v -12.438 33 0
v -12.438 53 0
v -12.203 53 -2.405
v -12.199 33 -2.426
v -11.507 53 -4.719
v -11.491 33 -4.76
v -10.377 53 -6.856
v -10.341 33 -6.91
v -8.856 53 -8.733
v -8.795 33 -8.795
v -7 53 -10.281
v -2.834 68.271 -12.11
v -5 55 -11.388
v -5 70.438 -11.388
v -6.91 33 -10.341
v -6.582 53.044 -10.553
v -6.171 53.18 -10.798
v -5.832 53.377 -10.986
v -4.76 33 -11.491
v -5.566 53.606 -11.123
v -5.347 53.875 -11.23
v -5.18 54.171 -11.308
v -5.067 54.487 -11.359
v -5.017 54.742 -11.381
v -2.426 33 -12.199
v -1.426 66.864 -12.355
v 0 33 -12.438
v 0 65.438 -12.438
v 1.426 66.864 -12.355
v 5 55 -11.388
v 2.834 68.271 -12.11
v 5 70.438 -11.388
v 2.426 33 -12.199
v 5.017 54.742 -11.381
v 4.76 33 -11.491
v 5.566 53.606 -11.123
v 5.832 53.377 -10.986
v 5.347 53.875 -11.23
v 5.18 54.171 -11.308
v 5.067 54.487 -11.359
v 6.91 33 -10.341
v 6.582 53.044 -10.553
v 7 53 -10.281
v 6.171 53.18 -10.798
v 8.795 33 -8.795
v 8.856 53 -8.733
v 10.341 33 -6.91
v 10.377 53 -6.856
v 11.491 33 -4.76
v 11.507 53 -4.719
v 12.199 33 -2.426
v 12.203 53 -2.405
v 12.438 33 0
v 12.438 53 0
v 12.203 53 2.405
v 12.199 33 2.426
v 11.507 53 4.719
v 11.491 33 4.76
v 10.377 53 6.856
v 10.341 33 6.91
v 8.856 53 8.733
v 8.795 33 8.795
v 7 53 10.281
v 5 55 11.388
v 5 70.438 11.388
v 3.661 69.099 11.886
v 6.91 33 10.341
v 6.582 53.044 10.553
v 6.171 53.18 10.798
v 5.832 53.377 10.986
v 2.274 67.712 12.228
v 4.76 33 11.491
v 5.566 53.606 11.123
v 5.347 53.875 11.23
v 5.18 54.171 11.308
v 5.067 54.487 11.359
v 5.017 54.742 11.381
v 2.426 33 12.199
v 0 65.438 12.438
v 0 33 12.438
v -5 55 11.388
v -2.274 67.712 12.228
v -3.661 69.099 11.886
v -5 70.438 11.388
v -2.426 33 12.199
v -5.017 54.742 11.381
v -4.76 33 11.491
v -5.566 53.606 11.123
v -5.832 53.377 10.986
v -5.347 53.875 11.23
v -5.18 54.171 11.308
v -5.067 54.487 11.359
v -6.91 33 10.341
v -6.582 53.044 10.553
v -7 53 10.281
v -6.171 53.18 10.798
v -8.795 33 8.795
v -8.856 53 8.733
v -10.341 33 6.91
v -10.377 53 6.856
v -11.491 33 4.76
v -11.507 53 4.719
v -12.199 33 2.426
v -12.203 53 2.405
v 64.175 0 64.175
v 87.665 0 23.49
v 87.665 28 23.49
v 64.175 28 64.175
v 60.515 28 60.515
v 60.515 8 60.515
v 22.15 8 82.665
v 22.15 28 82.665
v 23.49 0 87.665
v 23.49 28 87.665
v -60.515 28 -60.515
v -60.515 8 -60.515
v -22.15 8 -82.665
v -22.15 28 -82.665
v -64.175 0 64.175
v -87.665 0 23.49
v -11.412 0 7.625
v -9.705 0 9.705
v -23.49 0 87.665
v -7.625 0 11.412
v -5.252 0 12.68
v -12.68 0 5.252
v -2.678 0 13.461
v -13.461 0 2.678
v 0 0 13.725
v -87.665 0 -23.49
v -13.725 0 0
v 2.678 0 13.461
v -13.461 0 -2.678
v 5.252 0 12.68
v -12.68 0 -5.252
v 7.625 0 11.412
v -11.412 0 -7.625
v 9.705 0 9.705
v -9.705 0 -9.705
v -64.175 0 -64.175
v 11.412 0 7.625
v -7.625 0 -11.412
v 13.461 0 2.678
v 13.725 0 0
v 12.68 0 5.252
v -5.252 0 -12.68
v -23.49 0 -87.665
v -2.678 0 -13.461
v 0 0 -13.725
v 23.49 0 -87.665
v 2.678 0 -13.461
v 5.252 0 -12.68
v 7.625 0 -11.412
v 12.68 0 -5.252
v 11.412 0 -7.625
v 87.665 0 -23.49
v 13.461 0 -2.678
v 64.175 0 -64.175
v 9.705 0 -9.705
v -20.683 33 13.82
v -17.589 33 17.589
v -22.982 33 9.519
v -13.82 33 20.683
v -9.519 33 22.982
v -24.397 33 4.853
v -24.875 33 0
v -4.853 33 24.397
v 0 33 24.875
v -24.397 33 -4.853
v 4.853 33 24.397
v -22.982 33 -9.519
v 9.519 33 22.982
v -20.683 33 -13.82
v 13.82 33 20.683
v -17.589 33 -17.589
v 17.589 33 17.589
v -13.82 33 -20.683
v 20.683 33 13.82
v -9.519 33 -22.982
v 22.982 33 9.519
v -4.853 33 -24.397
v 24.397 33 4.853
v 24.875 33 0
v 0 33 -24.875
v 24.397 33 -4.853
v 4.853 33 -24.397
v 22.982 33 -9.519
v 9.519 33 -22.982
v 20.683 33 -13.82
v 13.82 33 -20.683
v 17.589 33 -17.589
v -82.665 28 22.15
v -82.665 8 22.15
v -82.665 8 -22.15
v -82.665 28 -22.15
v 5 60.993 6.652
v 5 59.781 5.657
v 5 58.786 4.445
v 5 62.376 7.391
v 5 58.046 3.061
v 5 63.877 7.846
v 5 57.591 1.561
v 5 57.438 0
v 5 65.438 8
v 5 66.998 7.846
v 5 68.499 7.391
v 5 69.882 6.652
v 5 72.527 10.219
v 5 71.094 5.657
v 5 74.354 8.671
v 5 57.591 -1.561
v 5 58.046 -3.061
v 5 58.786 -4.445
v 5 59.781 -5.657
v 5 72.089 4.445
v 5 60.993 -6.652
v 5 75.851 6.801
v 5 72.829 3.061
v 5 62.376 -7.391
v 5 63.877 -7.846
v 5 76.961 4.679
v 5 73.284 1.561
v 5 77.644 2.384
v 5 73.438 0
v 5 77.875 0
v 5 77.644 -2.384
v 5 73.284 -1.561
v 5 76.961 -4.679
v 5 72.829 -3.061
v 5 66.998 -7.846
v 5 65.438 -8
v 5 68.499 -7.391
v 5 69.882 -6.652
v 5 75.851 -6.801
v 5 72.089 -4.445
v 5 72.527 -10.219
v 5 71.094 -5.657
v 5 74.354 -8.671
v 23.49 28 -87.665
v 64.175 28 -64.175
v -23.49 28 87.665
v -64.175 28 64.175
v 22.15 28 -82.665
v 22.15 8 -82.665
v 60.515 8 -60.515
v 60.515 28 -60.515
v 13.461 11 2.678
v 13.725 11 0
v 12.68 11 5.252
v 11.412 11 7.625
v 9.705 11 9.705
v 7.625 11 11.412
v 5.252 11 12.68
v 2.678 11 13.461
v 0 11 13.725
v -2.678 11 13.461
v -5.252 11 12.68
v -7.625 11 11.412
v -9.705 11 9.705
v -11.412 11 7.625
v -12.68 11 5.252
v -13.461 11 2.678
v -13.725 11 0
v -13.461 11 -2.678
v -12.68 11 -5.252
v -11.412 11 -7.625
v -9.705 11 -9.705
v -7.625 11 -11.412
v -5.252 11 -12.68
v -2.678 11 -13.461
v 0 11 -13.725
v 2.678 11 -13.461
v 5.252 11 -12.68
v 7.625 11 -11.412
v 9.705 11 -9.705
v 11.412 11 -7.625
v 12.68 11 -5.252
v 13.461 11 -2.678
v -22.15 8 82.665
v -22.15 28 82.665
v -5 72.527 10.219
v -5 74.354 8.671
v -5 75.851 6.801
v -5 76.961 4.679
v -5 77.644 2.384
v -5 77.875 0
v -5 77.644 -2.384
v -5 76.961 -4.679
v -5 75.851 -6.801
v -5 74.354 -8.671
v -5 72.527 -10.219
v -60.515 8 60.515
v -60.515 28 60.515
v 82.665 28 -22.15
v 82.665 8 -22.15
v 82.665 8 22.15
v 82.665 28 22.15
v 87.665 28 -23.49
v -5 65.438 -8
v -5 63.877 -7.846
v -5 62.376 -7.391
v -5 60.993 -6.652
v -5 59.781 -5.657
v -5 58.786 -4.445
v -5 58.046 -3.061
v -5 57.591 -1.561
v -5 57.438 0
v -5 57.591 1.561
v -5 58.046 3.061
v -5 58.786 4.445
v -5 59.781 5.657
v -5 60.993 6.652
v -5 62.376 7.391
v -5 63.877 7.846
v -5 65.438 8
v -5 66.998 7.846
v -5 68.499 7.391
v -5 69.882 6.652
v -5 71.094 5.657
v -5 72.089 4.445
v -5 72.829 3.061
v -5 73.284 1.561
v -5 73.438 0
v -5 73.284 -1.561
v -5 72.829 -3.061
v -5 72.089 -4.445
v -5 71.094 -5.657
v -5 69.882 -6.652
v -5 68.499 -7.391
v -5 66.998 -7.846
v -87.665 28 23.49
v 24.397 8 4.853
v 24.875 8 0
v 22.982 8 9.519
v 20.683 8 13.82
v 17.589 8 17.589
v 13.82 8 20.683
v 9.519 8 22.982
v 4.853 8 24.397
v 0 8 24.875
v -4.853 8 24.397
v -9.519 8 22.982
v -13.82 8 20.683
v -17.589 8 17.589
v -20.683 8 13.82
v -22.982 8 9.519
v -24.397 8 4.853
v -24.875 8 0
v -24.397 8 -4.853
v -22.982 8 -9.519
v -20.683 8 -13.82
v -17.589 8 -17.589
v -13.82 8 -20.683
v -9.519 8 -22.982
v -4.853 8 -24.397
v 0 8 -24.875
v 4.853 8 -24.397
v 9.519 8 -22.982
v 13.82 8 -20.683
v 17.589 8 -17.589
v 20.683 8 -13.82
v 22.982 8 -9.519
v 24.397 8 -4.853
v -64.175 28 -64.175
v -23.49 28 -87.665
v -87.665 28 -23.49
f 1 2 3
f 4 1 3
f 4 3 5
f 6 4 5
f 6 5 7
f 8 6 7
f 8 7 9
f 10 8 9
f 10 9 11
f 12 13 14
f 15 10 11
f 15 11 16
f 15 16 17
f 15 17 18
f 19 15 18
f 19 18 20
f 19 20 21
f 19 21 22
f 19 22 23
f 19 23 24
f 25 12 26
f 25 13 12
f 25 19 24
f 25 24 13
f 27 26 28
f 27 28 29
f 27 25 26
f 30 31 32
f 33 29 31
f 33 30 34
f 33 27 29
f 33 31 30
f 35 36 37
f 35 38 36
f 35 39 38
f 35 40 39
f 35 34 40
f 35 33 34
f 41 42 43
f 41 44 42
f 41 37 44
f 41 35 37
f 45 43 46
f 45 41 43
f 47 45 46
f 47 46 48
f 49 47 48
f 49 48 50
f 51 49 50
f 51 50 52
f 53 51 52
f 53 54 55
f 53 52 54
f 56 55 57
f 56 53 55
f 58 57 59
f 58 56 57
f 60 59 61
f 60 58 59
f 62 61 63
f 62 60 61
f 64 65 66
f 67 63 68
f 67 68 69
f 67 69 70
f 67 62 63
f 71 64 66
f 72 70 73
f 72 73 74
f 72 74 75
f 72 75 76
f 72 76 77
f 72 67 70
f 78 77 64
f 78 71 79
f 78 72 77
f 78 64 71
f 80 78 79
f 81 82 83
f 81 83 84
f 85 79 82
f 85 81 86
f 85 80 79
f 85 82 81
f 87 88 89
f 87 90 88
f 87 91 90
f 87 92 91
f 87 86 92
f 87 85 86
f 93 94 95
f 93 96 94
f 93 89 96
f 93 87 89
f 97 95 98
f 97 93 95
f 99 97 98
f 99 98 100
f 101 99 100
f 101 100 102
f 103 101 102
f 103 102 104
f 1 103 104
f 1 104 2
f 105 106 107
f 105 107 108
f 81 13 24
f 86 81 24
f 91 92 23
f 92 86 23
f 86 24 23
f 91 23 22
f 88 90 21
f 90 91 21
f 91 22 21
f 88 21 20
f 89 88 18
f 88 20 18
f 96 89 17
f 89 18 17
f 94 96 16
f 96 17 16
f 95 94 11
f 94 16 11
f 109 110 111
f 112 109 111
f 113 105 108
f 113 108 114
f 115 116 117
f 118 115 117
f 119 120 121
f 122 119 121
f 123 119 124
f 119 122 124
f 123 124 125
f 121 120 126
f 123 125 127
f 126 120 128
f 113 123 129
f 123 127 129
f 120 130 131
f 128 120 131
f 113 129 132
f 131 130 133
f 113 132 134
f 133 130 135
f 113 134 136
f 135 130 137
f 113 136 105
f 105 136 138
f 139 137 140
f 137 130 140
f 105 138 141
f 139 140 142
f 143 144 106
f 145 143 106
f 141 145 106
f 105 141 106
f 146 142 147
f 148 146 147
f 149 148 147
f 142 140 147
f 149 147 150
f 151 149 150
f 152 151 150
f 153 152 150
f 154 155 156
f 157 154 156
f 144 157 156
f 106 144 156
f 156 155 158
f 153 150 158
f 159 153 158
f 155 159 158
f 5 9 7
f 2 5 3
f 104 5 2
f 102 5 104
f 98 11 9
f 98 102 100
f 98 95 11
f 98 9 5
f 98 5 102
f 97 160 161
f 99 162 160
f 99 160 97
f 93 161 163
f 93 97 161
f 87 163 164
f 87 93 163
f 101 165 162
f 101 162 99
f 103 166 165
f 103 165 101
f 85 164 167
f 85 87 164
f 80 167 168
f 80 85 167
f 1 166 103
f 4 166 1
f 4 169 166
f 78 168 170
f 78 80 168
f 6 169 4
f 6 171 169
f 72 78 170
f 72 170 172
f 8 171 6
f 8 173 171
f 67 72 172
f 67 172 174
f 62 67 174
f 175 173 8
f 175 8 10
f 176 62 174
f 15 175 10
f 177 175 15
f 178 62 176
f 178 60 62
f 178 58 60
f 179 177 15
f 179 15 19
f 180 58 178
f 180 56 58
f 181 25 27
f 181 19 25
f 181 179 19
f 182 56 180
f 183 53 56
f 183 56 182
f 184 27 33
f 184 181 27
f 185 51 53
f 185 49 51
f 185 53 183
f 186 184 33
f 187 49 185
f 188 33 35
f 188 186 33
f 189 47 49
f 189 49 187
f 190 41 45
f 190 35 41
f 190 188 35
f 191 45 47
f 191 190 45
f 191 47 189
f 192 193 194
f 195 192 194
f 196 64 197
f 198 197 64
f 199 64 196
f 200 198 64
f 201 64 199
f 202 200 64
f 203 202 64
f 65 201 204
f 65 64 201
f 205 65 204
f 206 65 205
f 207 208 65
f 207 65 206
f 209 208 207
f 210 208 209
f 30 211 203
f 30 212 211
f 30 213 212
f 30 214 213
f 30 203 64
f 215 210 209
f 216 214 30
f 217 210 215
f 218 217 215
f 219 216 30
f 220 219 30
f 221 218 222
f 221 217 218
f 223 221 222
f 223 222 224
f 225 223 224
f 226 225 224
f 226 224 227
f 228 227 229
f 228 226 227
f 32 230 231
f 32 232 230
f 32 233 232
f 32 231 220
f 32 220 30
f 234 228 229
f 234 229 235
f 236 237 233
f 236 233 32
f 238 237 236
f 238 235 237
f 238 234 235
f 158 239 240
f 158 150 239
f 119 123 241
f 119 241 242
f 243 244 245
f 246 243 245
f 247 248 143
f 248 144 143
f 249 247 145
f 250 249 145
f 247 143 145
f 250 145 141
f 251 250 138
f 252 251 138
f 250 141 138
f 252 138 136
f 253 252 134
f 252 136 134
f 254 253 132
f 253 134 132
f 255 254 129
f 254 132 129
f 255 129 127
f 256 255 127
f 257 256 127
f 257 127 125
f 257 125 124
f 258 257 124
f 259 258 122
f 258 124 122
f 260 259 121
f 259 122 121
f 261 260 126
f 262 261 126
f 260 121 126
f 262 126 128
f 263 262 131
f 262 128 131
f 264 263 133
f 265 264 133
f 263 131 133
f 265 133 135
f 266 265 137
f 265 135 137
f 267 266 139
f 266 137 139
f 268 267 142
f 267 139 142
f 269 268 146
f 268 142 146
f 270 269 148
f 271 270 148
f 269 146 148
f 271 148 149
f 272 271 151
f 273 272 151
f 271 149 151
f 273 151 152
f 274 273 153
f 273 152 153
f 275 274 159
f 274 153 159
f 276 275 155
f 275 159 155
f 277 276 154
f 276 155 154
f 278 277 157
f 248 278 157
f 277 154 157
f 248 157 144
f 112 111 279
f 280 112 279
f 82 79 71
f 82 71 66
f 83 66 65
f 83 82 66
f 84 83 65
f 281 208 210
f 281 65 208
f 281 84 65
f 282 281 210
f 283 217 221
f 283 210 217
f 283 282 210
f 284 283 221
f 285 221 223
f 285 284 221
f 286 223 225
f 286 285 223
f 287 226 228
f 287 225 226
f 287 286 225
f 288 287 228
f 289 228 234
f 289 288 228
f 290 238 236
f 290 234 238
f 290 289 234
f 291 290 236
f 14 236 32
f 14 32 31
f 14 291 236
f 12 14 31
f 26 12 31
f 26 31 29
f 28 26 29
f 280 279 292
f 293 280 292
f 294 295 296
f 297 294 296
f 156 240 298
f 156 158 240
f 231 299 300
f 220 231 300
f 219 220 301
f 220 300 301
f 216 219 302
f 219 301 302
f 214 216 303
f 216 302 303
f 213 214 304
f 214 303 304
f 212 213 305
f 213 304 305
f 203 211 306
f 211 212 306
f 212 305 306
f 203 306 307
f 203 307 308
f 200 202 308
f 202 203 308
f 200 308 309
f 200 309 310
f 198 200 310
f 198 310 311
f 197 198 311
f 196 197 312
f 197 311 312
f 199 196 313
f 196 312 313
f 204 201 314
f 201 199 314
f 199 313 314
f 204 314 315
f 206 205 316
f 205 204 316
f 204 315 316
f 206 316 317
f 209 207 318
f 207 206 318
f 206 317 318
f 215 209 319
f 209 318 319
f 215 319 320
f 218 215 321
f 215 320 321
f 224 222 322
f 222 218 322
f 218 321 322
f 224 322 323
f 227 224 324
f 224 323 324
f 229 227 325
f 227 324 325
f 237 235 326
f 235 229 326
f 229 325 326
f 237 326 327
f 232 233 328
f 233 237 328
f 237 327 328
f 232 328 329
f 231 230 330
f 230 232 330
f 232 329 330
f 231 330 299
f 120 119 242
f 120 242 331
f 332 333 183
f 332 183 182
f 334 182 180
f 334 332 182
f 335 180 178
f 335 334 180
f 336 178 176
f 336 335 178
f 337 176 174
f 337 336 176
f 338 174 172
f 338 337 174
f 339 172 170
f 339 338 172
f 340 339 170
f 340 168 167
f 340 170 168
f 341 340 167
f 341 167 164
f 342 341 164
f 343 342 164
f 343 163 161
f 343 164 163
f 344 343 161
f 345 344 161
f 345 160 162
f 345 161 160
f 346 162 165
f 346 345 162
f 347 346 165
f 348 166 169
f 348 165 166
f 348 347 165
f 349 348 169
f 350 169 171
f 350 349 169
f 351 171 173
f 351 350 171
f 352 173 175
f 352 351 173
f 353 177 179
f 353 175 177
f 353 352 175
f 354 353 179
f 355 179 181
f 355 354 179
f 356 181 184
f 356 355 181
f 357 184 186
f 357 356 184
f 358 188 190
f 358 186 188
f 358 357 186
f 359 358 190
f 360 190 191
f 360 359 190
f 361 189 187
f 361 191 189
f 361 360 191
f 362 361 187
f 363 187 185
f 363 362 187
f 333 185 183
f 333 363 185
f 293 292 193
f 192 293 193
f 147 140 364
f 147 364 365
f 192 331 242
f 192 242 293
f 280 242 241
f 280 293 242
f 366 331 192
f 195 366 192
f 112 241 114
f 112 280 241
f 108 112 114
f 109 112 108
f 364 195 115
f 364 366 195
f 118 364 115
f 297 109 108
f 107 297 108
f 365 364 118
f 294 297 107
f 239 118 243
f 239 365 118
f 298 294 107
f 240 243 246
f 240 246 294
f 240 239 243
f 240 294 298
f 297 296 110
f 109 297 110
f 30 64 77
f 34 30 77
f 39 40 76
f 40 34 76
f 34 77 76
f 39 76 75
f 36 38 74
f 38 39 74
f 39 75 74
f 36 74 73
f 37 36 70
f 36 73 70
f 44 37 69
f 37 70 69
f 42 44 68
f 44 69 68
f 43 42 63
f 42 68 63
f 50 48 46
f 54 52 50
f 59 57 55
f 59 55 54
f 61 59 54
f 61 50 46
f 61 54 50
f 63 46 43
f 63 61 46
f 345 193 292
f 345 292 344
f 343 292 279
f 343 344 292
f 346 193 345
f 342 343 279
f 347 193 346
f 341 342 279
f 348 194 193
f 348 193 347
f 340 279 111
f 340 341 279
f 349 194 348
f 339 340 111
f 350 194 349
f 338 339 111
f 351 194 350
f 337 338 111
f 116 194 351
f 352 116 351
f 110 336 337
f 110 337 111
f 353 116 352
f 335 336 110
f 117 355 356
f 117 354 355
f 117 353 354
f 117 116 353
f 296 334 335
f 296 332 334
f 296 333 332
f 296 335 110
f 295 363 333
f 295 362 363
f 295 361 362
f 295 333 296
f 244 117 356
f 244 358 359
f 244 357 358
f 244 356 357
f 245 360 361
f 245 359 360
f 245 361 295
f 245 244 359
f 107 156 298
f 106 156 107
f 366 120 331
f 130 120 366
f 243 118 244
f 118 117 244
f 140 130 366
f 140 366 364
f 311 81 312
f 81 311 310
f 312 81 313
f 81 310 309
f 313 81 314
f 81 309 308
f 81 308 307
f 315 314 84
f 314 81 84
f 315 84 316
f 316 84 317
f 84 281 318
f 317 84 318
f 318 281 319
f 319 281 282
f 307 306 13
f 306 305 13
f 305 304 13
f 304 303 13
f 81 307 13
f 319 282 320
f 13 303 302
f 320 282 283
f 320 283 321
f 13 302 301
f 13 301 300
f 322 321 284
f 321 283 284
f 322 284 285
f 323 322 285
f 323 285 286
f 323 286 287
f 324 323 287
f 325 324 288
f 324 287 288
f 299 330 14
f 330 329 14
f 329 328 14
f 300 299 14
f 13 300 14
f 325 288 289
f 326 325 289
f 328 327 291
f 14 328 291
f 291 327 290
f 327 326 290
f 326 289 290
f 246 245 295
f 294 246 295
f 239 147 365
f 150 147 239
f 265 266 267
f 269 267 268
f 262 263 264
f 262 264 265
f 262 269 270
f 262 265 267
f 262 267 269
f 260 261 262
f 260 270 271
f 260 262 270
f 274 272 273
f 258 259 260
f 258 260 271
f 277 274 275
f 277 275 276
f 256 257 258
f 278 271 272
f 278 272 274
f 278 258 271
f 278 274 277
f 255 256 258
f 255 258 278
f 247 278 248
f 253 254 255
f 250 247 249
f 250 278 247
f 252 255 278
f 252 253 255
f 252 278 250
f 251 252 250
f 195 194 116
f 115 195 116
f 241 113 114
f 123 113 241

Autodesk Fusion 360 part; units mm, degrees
sketch "Sketch1" plane through (0, 0, 0) normal (0, 1, 0) x (1, 0, 0)
  circle A0 centre (0, 0) radius 24.875
  line L0 (-23.4897, 87.6649) -> (23.4897, 87.6649)
  line L1 (23.4897, 87.6649) -> (64.1752, 64.1752)
  line L2 (64.1752, 64.1752) -> (87.6649, 23.4897)
  line L3 (87.6649, 23.4897) -> (87.6649, -23.4897)
  line L4 (87.6649, -23.4897) -> (64.1752, -64.1752)
  line L5 (64.1752, -64.1752) -> (23.4897, -87.6649)
  line L6 (23.4897, -87.6649) -> (-23.4897, -87.6649)
  line L7 (-23.4897, -87.6649) -> (-64.1752, -64.1752)
  line L8 (-64.1752, -64.1752) -> (-87.6649, -23.4897)
  line L9 (-87.6649, -23.4897) -> (-87.6649, 23.4897)
  line L10 (-87.6649, 23.4897) -> (-64.1752, 64.1752)
  line L11 (-64.1752, 64.1752) -> (-23.4897, 87.6649)
  line L12 (-87.6649, 0) -> (0, 0) construction
  line L13 (0, 0) -> (87.6649, 0) construction
  line L14 (0, 0) -> (0, -87.6649) construction
  line L15 (0, 0) -> (0, 87.6649) construction
  line L16 (-22.15, 82.6649) -> (22.15, 82.6649)
  line L17 (22.15, 82.6649) -> (60.5149, 60.5149)
  line L18 (60.5149, 60.5149) -> (82.6649, 22.15)
  line L19 (82.6649, 22.15) -> (82.6649, -22.15)
  line L20 (82.6649, -22.15) -> (60.5149, -60.5149)
  line L21 (60.5149, -60.5149) -> (22.15, -82.6649)
  line L22 (22.15, -82.6649) -> (-22.15, -82.6649)
  line L23 (-22.15, -82.6649) -> (-60.5149, -60.5149)
  line L24 (-60.5149, -60.5149) -> (-82.6649, -22.15)
  line L25 (-82.6649, -22.15) -> (-82.6649, 22.15)
  line L26 (-82.6649, 22.15) -> (-60.5149, 60.5149)
  line L27 (-60.5149, 60.5149) -> (-22.15, 82.6649)
  line L28 (0, 0) -> (-82.6649, 0) construction
  line L29 (0, 0) -> (0, 82.6649) construction
  line L30 (0, 0) -> (82.6649, 0) construction
  line L31 (0, 0) -> (0, -82.6649) construction
  point P0 (24.875, 0)
  dimension "d1" = 49.75
  dimension "d3" = 150
  dimension "d4" = 62.7899
  dimension "d5" = 5
  dimension "d9" = 150
  dimension "d10" = 44.3
extrude "Extrude1" add sketch "Sketch1" along normal blind 8 contours L16 L17 L18 L19 L20 L21 L22 L23 L24 L25 L26 L27
extrude "Extrude6" add sketch "Sketch1" along normal blind 28 contours L0 L1 L2 L3 L4 L5 L6 L7 L8 L9 L10 L11
extrude "Extrude2" add sketch "Sketch1" along normal blind 33 contours A0
sketch "Sketch2" plane through (0, 33, 0) normal (0, 1, 0) x (-1, 0, 0)
  circle A0 centre (0, 0) radius 24.875
  circle A1 centre (0, 0) radius 12.4375
  dimension "d15" = 49.75
  dimension "d16" = 24.875
extrude "Extrude3" add sketch "Sketch2" along normal blind 20 contours A1
sketch "Sketch3" plane through (0, 0, 0) normal (1, 0, 0) x (0, 0, -1)
  line L0 (12.4375, 53) -> (-12.4375, 53)
  line L1 (-12.4375, 33) -> (12.4375, 33)
  line L2 (0, 53) -> (0, 65.4375) construction
  circle A0 centre (0, 65.4375) radius 12.4375
  circle A1 centre (0, 65.4375) radius 8
  line L3 (0, 65.4375) -> (-12.4375, 65.4375) construction
  line L4 (0, 65.4375) -> (12.4375, 65.4375) construction
  line L5 (-12.4375, 65.4375) -> (-12.4375, 53)
  line L6 (12.4375, 65.4375) -> (12.4375, 53)
  dimension "d19" = 24.875
  dimension "d20" = 16
  dimension "d21" = 24.875
extrude "Extrude4" add sketch "Sketch3" along normal mid plane 10
extrude "Extrude5" cut 1 faces at (20.5903, 33, 1.8537) along direction (0, 1, 0) blind 50
fillet "Fillet1" radius 2 2 edges at (5, 53, 0) (-5, 53, 0)
sketch "Sketch4" plane through (0, 0, 0) normal (0, -1, 0) x (1, 0, 0)
  line L0 (-87.6649, -23.4897) -> (-64.1752, -64.1752)
  line L1 (-64.1752, -64.1752) -> (-23.4897, -87.6649)
  line L2 (-23.4897, -87.6649) -> (23.4897, -87.6649)
  line L3 (23.4897, -87.6649) -> (64.1752, -64.1752)
  line L4 (64.1752, -64.1752) -> (87.6649, -23.4897)
  line L5 (87.6649, -23.4897) -> (87.6649, 23.4897)
  line L6 (87.6649, 23.4897) -> (64.1752, 64.1752)
  line L7 (64.1752, 64.1752) -> (23.4897, 87.6649)
  line L8 (23.4897, 87.6649) -> (-23.4897, 87.6649)
  line L9 (-23.4897, 87.6649) -> (-64.1752, 64.1752)
  line L10 (-64.1752, 64.1752) -> (-87.6649, 23.4897)
  line L11 (-87.6649, 23.4897) -> (-87.6649, -23.4897)
  line L12 (0, 87.6649) -> (0, -87.6649) construction
  line L13 (87.6649, 0) -> (-87.6649, 0) construction
  circle A0 centre (0, 0) radius 13.725
  dimension "d30" = 27.45
extrude "Extrude7" cut sketch "Sketch4" against normal blind 11 contours A0
equation "d9 = d3"
equation "d11 = 8 mm"
equation "d13 = d11 + 25 mm"
equation "d16 = d15 / 2"
equation "d19 = d21"
equation "d28 = d11 + 20 mm"
